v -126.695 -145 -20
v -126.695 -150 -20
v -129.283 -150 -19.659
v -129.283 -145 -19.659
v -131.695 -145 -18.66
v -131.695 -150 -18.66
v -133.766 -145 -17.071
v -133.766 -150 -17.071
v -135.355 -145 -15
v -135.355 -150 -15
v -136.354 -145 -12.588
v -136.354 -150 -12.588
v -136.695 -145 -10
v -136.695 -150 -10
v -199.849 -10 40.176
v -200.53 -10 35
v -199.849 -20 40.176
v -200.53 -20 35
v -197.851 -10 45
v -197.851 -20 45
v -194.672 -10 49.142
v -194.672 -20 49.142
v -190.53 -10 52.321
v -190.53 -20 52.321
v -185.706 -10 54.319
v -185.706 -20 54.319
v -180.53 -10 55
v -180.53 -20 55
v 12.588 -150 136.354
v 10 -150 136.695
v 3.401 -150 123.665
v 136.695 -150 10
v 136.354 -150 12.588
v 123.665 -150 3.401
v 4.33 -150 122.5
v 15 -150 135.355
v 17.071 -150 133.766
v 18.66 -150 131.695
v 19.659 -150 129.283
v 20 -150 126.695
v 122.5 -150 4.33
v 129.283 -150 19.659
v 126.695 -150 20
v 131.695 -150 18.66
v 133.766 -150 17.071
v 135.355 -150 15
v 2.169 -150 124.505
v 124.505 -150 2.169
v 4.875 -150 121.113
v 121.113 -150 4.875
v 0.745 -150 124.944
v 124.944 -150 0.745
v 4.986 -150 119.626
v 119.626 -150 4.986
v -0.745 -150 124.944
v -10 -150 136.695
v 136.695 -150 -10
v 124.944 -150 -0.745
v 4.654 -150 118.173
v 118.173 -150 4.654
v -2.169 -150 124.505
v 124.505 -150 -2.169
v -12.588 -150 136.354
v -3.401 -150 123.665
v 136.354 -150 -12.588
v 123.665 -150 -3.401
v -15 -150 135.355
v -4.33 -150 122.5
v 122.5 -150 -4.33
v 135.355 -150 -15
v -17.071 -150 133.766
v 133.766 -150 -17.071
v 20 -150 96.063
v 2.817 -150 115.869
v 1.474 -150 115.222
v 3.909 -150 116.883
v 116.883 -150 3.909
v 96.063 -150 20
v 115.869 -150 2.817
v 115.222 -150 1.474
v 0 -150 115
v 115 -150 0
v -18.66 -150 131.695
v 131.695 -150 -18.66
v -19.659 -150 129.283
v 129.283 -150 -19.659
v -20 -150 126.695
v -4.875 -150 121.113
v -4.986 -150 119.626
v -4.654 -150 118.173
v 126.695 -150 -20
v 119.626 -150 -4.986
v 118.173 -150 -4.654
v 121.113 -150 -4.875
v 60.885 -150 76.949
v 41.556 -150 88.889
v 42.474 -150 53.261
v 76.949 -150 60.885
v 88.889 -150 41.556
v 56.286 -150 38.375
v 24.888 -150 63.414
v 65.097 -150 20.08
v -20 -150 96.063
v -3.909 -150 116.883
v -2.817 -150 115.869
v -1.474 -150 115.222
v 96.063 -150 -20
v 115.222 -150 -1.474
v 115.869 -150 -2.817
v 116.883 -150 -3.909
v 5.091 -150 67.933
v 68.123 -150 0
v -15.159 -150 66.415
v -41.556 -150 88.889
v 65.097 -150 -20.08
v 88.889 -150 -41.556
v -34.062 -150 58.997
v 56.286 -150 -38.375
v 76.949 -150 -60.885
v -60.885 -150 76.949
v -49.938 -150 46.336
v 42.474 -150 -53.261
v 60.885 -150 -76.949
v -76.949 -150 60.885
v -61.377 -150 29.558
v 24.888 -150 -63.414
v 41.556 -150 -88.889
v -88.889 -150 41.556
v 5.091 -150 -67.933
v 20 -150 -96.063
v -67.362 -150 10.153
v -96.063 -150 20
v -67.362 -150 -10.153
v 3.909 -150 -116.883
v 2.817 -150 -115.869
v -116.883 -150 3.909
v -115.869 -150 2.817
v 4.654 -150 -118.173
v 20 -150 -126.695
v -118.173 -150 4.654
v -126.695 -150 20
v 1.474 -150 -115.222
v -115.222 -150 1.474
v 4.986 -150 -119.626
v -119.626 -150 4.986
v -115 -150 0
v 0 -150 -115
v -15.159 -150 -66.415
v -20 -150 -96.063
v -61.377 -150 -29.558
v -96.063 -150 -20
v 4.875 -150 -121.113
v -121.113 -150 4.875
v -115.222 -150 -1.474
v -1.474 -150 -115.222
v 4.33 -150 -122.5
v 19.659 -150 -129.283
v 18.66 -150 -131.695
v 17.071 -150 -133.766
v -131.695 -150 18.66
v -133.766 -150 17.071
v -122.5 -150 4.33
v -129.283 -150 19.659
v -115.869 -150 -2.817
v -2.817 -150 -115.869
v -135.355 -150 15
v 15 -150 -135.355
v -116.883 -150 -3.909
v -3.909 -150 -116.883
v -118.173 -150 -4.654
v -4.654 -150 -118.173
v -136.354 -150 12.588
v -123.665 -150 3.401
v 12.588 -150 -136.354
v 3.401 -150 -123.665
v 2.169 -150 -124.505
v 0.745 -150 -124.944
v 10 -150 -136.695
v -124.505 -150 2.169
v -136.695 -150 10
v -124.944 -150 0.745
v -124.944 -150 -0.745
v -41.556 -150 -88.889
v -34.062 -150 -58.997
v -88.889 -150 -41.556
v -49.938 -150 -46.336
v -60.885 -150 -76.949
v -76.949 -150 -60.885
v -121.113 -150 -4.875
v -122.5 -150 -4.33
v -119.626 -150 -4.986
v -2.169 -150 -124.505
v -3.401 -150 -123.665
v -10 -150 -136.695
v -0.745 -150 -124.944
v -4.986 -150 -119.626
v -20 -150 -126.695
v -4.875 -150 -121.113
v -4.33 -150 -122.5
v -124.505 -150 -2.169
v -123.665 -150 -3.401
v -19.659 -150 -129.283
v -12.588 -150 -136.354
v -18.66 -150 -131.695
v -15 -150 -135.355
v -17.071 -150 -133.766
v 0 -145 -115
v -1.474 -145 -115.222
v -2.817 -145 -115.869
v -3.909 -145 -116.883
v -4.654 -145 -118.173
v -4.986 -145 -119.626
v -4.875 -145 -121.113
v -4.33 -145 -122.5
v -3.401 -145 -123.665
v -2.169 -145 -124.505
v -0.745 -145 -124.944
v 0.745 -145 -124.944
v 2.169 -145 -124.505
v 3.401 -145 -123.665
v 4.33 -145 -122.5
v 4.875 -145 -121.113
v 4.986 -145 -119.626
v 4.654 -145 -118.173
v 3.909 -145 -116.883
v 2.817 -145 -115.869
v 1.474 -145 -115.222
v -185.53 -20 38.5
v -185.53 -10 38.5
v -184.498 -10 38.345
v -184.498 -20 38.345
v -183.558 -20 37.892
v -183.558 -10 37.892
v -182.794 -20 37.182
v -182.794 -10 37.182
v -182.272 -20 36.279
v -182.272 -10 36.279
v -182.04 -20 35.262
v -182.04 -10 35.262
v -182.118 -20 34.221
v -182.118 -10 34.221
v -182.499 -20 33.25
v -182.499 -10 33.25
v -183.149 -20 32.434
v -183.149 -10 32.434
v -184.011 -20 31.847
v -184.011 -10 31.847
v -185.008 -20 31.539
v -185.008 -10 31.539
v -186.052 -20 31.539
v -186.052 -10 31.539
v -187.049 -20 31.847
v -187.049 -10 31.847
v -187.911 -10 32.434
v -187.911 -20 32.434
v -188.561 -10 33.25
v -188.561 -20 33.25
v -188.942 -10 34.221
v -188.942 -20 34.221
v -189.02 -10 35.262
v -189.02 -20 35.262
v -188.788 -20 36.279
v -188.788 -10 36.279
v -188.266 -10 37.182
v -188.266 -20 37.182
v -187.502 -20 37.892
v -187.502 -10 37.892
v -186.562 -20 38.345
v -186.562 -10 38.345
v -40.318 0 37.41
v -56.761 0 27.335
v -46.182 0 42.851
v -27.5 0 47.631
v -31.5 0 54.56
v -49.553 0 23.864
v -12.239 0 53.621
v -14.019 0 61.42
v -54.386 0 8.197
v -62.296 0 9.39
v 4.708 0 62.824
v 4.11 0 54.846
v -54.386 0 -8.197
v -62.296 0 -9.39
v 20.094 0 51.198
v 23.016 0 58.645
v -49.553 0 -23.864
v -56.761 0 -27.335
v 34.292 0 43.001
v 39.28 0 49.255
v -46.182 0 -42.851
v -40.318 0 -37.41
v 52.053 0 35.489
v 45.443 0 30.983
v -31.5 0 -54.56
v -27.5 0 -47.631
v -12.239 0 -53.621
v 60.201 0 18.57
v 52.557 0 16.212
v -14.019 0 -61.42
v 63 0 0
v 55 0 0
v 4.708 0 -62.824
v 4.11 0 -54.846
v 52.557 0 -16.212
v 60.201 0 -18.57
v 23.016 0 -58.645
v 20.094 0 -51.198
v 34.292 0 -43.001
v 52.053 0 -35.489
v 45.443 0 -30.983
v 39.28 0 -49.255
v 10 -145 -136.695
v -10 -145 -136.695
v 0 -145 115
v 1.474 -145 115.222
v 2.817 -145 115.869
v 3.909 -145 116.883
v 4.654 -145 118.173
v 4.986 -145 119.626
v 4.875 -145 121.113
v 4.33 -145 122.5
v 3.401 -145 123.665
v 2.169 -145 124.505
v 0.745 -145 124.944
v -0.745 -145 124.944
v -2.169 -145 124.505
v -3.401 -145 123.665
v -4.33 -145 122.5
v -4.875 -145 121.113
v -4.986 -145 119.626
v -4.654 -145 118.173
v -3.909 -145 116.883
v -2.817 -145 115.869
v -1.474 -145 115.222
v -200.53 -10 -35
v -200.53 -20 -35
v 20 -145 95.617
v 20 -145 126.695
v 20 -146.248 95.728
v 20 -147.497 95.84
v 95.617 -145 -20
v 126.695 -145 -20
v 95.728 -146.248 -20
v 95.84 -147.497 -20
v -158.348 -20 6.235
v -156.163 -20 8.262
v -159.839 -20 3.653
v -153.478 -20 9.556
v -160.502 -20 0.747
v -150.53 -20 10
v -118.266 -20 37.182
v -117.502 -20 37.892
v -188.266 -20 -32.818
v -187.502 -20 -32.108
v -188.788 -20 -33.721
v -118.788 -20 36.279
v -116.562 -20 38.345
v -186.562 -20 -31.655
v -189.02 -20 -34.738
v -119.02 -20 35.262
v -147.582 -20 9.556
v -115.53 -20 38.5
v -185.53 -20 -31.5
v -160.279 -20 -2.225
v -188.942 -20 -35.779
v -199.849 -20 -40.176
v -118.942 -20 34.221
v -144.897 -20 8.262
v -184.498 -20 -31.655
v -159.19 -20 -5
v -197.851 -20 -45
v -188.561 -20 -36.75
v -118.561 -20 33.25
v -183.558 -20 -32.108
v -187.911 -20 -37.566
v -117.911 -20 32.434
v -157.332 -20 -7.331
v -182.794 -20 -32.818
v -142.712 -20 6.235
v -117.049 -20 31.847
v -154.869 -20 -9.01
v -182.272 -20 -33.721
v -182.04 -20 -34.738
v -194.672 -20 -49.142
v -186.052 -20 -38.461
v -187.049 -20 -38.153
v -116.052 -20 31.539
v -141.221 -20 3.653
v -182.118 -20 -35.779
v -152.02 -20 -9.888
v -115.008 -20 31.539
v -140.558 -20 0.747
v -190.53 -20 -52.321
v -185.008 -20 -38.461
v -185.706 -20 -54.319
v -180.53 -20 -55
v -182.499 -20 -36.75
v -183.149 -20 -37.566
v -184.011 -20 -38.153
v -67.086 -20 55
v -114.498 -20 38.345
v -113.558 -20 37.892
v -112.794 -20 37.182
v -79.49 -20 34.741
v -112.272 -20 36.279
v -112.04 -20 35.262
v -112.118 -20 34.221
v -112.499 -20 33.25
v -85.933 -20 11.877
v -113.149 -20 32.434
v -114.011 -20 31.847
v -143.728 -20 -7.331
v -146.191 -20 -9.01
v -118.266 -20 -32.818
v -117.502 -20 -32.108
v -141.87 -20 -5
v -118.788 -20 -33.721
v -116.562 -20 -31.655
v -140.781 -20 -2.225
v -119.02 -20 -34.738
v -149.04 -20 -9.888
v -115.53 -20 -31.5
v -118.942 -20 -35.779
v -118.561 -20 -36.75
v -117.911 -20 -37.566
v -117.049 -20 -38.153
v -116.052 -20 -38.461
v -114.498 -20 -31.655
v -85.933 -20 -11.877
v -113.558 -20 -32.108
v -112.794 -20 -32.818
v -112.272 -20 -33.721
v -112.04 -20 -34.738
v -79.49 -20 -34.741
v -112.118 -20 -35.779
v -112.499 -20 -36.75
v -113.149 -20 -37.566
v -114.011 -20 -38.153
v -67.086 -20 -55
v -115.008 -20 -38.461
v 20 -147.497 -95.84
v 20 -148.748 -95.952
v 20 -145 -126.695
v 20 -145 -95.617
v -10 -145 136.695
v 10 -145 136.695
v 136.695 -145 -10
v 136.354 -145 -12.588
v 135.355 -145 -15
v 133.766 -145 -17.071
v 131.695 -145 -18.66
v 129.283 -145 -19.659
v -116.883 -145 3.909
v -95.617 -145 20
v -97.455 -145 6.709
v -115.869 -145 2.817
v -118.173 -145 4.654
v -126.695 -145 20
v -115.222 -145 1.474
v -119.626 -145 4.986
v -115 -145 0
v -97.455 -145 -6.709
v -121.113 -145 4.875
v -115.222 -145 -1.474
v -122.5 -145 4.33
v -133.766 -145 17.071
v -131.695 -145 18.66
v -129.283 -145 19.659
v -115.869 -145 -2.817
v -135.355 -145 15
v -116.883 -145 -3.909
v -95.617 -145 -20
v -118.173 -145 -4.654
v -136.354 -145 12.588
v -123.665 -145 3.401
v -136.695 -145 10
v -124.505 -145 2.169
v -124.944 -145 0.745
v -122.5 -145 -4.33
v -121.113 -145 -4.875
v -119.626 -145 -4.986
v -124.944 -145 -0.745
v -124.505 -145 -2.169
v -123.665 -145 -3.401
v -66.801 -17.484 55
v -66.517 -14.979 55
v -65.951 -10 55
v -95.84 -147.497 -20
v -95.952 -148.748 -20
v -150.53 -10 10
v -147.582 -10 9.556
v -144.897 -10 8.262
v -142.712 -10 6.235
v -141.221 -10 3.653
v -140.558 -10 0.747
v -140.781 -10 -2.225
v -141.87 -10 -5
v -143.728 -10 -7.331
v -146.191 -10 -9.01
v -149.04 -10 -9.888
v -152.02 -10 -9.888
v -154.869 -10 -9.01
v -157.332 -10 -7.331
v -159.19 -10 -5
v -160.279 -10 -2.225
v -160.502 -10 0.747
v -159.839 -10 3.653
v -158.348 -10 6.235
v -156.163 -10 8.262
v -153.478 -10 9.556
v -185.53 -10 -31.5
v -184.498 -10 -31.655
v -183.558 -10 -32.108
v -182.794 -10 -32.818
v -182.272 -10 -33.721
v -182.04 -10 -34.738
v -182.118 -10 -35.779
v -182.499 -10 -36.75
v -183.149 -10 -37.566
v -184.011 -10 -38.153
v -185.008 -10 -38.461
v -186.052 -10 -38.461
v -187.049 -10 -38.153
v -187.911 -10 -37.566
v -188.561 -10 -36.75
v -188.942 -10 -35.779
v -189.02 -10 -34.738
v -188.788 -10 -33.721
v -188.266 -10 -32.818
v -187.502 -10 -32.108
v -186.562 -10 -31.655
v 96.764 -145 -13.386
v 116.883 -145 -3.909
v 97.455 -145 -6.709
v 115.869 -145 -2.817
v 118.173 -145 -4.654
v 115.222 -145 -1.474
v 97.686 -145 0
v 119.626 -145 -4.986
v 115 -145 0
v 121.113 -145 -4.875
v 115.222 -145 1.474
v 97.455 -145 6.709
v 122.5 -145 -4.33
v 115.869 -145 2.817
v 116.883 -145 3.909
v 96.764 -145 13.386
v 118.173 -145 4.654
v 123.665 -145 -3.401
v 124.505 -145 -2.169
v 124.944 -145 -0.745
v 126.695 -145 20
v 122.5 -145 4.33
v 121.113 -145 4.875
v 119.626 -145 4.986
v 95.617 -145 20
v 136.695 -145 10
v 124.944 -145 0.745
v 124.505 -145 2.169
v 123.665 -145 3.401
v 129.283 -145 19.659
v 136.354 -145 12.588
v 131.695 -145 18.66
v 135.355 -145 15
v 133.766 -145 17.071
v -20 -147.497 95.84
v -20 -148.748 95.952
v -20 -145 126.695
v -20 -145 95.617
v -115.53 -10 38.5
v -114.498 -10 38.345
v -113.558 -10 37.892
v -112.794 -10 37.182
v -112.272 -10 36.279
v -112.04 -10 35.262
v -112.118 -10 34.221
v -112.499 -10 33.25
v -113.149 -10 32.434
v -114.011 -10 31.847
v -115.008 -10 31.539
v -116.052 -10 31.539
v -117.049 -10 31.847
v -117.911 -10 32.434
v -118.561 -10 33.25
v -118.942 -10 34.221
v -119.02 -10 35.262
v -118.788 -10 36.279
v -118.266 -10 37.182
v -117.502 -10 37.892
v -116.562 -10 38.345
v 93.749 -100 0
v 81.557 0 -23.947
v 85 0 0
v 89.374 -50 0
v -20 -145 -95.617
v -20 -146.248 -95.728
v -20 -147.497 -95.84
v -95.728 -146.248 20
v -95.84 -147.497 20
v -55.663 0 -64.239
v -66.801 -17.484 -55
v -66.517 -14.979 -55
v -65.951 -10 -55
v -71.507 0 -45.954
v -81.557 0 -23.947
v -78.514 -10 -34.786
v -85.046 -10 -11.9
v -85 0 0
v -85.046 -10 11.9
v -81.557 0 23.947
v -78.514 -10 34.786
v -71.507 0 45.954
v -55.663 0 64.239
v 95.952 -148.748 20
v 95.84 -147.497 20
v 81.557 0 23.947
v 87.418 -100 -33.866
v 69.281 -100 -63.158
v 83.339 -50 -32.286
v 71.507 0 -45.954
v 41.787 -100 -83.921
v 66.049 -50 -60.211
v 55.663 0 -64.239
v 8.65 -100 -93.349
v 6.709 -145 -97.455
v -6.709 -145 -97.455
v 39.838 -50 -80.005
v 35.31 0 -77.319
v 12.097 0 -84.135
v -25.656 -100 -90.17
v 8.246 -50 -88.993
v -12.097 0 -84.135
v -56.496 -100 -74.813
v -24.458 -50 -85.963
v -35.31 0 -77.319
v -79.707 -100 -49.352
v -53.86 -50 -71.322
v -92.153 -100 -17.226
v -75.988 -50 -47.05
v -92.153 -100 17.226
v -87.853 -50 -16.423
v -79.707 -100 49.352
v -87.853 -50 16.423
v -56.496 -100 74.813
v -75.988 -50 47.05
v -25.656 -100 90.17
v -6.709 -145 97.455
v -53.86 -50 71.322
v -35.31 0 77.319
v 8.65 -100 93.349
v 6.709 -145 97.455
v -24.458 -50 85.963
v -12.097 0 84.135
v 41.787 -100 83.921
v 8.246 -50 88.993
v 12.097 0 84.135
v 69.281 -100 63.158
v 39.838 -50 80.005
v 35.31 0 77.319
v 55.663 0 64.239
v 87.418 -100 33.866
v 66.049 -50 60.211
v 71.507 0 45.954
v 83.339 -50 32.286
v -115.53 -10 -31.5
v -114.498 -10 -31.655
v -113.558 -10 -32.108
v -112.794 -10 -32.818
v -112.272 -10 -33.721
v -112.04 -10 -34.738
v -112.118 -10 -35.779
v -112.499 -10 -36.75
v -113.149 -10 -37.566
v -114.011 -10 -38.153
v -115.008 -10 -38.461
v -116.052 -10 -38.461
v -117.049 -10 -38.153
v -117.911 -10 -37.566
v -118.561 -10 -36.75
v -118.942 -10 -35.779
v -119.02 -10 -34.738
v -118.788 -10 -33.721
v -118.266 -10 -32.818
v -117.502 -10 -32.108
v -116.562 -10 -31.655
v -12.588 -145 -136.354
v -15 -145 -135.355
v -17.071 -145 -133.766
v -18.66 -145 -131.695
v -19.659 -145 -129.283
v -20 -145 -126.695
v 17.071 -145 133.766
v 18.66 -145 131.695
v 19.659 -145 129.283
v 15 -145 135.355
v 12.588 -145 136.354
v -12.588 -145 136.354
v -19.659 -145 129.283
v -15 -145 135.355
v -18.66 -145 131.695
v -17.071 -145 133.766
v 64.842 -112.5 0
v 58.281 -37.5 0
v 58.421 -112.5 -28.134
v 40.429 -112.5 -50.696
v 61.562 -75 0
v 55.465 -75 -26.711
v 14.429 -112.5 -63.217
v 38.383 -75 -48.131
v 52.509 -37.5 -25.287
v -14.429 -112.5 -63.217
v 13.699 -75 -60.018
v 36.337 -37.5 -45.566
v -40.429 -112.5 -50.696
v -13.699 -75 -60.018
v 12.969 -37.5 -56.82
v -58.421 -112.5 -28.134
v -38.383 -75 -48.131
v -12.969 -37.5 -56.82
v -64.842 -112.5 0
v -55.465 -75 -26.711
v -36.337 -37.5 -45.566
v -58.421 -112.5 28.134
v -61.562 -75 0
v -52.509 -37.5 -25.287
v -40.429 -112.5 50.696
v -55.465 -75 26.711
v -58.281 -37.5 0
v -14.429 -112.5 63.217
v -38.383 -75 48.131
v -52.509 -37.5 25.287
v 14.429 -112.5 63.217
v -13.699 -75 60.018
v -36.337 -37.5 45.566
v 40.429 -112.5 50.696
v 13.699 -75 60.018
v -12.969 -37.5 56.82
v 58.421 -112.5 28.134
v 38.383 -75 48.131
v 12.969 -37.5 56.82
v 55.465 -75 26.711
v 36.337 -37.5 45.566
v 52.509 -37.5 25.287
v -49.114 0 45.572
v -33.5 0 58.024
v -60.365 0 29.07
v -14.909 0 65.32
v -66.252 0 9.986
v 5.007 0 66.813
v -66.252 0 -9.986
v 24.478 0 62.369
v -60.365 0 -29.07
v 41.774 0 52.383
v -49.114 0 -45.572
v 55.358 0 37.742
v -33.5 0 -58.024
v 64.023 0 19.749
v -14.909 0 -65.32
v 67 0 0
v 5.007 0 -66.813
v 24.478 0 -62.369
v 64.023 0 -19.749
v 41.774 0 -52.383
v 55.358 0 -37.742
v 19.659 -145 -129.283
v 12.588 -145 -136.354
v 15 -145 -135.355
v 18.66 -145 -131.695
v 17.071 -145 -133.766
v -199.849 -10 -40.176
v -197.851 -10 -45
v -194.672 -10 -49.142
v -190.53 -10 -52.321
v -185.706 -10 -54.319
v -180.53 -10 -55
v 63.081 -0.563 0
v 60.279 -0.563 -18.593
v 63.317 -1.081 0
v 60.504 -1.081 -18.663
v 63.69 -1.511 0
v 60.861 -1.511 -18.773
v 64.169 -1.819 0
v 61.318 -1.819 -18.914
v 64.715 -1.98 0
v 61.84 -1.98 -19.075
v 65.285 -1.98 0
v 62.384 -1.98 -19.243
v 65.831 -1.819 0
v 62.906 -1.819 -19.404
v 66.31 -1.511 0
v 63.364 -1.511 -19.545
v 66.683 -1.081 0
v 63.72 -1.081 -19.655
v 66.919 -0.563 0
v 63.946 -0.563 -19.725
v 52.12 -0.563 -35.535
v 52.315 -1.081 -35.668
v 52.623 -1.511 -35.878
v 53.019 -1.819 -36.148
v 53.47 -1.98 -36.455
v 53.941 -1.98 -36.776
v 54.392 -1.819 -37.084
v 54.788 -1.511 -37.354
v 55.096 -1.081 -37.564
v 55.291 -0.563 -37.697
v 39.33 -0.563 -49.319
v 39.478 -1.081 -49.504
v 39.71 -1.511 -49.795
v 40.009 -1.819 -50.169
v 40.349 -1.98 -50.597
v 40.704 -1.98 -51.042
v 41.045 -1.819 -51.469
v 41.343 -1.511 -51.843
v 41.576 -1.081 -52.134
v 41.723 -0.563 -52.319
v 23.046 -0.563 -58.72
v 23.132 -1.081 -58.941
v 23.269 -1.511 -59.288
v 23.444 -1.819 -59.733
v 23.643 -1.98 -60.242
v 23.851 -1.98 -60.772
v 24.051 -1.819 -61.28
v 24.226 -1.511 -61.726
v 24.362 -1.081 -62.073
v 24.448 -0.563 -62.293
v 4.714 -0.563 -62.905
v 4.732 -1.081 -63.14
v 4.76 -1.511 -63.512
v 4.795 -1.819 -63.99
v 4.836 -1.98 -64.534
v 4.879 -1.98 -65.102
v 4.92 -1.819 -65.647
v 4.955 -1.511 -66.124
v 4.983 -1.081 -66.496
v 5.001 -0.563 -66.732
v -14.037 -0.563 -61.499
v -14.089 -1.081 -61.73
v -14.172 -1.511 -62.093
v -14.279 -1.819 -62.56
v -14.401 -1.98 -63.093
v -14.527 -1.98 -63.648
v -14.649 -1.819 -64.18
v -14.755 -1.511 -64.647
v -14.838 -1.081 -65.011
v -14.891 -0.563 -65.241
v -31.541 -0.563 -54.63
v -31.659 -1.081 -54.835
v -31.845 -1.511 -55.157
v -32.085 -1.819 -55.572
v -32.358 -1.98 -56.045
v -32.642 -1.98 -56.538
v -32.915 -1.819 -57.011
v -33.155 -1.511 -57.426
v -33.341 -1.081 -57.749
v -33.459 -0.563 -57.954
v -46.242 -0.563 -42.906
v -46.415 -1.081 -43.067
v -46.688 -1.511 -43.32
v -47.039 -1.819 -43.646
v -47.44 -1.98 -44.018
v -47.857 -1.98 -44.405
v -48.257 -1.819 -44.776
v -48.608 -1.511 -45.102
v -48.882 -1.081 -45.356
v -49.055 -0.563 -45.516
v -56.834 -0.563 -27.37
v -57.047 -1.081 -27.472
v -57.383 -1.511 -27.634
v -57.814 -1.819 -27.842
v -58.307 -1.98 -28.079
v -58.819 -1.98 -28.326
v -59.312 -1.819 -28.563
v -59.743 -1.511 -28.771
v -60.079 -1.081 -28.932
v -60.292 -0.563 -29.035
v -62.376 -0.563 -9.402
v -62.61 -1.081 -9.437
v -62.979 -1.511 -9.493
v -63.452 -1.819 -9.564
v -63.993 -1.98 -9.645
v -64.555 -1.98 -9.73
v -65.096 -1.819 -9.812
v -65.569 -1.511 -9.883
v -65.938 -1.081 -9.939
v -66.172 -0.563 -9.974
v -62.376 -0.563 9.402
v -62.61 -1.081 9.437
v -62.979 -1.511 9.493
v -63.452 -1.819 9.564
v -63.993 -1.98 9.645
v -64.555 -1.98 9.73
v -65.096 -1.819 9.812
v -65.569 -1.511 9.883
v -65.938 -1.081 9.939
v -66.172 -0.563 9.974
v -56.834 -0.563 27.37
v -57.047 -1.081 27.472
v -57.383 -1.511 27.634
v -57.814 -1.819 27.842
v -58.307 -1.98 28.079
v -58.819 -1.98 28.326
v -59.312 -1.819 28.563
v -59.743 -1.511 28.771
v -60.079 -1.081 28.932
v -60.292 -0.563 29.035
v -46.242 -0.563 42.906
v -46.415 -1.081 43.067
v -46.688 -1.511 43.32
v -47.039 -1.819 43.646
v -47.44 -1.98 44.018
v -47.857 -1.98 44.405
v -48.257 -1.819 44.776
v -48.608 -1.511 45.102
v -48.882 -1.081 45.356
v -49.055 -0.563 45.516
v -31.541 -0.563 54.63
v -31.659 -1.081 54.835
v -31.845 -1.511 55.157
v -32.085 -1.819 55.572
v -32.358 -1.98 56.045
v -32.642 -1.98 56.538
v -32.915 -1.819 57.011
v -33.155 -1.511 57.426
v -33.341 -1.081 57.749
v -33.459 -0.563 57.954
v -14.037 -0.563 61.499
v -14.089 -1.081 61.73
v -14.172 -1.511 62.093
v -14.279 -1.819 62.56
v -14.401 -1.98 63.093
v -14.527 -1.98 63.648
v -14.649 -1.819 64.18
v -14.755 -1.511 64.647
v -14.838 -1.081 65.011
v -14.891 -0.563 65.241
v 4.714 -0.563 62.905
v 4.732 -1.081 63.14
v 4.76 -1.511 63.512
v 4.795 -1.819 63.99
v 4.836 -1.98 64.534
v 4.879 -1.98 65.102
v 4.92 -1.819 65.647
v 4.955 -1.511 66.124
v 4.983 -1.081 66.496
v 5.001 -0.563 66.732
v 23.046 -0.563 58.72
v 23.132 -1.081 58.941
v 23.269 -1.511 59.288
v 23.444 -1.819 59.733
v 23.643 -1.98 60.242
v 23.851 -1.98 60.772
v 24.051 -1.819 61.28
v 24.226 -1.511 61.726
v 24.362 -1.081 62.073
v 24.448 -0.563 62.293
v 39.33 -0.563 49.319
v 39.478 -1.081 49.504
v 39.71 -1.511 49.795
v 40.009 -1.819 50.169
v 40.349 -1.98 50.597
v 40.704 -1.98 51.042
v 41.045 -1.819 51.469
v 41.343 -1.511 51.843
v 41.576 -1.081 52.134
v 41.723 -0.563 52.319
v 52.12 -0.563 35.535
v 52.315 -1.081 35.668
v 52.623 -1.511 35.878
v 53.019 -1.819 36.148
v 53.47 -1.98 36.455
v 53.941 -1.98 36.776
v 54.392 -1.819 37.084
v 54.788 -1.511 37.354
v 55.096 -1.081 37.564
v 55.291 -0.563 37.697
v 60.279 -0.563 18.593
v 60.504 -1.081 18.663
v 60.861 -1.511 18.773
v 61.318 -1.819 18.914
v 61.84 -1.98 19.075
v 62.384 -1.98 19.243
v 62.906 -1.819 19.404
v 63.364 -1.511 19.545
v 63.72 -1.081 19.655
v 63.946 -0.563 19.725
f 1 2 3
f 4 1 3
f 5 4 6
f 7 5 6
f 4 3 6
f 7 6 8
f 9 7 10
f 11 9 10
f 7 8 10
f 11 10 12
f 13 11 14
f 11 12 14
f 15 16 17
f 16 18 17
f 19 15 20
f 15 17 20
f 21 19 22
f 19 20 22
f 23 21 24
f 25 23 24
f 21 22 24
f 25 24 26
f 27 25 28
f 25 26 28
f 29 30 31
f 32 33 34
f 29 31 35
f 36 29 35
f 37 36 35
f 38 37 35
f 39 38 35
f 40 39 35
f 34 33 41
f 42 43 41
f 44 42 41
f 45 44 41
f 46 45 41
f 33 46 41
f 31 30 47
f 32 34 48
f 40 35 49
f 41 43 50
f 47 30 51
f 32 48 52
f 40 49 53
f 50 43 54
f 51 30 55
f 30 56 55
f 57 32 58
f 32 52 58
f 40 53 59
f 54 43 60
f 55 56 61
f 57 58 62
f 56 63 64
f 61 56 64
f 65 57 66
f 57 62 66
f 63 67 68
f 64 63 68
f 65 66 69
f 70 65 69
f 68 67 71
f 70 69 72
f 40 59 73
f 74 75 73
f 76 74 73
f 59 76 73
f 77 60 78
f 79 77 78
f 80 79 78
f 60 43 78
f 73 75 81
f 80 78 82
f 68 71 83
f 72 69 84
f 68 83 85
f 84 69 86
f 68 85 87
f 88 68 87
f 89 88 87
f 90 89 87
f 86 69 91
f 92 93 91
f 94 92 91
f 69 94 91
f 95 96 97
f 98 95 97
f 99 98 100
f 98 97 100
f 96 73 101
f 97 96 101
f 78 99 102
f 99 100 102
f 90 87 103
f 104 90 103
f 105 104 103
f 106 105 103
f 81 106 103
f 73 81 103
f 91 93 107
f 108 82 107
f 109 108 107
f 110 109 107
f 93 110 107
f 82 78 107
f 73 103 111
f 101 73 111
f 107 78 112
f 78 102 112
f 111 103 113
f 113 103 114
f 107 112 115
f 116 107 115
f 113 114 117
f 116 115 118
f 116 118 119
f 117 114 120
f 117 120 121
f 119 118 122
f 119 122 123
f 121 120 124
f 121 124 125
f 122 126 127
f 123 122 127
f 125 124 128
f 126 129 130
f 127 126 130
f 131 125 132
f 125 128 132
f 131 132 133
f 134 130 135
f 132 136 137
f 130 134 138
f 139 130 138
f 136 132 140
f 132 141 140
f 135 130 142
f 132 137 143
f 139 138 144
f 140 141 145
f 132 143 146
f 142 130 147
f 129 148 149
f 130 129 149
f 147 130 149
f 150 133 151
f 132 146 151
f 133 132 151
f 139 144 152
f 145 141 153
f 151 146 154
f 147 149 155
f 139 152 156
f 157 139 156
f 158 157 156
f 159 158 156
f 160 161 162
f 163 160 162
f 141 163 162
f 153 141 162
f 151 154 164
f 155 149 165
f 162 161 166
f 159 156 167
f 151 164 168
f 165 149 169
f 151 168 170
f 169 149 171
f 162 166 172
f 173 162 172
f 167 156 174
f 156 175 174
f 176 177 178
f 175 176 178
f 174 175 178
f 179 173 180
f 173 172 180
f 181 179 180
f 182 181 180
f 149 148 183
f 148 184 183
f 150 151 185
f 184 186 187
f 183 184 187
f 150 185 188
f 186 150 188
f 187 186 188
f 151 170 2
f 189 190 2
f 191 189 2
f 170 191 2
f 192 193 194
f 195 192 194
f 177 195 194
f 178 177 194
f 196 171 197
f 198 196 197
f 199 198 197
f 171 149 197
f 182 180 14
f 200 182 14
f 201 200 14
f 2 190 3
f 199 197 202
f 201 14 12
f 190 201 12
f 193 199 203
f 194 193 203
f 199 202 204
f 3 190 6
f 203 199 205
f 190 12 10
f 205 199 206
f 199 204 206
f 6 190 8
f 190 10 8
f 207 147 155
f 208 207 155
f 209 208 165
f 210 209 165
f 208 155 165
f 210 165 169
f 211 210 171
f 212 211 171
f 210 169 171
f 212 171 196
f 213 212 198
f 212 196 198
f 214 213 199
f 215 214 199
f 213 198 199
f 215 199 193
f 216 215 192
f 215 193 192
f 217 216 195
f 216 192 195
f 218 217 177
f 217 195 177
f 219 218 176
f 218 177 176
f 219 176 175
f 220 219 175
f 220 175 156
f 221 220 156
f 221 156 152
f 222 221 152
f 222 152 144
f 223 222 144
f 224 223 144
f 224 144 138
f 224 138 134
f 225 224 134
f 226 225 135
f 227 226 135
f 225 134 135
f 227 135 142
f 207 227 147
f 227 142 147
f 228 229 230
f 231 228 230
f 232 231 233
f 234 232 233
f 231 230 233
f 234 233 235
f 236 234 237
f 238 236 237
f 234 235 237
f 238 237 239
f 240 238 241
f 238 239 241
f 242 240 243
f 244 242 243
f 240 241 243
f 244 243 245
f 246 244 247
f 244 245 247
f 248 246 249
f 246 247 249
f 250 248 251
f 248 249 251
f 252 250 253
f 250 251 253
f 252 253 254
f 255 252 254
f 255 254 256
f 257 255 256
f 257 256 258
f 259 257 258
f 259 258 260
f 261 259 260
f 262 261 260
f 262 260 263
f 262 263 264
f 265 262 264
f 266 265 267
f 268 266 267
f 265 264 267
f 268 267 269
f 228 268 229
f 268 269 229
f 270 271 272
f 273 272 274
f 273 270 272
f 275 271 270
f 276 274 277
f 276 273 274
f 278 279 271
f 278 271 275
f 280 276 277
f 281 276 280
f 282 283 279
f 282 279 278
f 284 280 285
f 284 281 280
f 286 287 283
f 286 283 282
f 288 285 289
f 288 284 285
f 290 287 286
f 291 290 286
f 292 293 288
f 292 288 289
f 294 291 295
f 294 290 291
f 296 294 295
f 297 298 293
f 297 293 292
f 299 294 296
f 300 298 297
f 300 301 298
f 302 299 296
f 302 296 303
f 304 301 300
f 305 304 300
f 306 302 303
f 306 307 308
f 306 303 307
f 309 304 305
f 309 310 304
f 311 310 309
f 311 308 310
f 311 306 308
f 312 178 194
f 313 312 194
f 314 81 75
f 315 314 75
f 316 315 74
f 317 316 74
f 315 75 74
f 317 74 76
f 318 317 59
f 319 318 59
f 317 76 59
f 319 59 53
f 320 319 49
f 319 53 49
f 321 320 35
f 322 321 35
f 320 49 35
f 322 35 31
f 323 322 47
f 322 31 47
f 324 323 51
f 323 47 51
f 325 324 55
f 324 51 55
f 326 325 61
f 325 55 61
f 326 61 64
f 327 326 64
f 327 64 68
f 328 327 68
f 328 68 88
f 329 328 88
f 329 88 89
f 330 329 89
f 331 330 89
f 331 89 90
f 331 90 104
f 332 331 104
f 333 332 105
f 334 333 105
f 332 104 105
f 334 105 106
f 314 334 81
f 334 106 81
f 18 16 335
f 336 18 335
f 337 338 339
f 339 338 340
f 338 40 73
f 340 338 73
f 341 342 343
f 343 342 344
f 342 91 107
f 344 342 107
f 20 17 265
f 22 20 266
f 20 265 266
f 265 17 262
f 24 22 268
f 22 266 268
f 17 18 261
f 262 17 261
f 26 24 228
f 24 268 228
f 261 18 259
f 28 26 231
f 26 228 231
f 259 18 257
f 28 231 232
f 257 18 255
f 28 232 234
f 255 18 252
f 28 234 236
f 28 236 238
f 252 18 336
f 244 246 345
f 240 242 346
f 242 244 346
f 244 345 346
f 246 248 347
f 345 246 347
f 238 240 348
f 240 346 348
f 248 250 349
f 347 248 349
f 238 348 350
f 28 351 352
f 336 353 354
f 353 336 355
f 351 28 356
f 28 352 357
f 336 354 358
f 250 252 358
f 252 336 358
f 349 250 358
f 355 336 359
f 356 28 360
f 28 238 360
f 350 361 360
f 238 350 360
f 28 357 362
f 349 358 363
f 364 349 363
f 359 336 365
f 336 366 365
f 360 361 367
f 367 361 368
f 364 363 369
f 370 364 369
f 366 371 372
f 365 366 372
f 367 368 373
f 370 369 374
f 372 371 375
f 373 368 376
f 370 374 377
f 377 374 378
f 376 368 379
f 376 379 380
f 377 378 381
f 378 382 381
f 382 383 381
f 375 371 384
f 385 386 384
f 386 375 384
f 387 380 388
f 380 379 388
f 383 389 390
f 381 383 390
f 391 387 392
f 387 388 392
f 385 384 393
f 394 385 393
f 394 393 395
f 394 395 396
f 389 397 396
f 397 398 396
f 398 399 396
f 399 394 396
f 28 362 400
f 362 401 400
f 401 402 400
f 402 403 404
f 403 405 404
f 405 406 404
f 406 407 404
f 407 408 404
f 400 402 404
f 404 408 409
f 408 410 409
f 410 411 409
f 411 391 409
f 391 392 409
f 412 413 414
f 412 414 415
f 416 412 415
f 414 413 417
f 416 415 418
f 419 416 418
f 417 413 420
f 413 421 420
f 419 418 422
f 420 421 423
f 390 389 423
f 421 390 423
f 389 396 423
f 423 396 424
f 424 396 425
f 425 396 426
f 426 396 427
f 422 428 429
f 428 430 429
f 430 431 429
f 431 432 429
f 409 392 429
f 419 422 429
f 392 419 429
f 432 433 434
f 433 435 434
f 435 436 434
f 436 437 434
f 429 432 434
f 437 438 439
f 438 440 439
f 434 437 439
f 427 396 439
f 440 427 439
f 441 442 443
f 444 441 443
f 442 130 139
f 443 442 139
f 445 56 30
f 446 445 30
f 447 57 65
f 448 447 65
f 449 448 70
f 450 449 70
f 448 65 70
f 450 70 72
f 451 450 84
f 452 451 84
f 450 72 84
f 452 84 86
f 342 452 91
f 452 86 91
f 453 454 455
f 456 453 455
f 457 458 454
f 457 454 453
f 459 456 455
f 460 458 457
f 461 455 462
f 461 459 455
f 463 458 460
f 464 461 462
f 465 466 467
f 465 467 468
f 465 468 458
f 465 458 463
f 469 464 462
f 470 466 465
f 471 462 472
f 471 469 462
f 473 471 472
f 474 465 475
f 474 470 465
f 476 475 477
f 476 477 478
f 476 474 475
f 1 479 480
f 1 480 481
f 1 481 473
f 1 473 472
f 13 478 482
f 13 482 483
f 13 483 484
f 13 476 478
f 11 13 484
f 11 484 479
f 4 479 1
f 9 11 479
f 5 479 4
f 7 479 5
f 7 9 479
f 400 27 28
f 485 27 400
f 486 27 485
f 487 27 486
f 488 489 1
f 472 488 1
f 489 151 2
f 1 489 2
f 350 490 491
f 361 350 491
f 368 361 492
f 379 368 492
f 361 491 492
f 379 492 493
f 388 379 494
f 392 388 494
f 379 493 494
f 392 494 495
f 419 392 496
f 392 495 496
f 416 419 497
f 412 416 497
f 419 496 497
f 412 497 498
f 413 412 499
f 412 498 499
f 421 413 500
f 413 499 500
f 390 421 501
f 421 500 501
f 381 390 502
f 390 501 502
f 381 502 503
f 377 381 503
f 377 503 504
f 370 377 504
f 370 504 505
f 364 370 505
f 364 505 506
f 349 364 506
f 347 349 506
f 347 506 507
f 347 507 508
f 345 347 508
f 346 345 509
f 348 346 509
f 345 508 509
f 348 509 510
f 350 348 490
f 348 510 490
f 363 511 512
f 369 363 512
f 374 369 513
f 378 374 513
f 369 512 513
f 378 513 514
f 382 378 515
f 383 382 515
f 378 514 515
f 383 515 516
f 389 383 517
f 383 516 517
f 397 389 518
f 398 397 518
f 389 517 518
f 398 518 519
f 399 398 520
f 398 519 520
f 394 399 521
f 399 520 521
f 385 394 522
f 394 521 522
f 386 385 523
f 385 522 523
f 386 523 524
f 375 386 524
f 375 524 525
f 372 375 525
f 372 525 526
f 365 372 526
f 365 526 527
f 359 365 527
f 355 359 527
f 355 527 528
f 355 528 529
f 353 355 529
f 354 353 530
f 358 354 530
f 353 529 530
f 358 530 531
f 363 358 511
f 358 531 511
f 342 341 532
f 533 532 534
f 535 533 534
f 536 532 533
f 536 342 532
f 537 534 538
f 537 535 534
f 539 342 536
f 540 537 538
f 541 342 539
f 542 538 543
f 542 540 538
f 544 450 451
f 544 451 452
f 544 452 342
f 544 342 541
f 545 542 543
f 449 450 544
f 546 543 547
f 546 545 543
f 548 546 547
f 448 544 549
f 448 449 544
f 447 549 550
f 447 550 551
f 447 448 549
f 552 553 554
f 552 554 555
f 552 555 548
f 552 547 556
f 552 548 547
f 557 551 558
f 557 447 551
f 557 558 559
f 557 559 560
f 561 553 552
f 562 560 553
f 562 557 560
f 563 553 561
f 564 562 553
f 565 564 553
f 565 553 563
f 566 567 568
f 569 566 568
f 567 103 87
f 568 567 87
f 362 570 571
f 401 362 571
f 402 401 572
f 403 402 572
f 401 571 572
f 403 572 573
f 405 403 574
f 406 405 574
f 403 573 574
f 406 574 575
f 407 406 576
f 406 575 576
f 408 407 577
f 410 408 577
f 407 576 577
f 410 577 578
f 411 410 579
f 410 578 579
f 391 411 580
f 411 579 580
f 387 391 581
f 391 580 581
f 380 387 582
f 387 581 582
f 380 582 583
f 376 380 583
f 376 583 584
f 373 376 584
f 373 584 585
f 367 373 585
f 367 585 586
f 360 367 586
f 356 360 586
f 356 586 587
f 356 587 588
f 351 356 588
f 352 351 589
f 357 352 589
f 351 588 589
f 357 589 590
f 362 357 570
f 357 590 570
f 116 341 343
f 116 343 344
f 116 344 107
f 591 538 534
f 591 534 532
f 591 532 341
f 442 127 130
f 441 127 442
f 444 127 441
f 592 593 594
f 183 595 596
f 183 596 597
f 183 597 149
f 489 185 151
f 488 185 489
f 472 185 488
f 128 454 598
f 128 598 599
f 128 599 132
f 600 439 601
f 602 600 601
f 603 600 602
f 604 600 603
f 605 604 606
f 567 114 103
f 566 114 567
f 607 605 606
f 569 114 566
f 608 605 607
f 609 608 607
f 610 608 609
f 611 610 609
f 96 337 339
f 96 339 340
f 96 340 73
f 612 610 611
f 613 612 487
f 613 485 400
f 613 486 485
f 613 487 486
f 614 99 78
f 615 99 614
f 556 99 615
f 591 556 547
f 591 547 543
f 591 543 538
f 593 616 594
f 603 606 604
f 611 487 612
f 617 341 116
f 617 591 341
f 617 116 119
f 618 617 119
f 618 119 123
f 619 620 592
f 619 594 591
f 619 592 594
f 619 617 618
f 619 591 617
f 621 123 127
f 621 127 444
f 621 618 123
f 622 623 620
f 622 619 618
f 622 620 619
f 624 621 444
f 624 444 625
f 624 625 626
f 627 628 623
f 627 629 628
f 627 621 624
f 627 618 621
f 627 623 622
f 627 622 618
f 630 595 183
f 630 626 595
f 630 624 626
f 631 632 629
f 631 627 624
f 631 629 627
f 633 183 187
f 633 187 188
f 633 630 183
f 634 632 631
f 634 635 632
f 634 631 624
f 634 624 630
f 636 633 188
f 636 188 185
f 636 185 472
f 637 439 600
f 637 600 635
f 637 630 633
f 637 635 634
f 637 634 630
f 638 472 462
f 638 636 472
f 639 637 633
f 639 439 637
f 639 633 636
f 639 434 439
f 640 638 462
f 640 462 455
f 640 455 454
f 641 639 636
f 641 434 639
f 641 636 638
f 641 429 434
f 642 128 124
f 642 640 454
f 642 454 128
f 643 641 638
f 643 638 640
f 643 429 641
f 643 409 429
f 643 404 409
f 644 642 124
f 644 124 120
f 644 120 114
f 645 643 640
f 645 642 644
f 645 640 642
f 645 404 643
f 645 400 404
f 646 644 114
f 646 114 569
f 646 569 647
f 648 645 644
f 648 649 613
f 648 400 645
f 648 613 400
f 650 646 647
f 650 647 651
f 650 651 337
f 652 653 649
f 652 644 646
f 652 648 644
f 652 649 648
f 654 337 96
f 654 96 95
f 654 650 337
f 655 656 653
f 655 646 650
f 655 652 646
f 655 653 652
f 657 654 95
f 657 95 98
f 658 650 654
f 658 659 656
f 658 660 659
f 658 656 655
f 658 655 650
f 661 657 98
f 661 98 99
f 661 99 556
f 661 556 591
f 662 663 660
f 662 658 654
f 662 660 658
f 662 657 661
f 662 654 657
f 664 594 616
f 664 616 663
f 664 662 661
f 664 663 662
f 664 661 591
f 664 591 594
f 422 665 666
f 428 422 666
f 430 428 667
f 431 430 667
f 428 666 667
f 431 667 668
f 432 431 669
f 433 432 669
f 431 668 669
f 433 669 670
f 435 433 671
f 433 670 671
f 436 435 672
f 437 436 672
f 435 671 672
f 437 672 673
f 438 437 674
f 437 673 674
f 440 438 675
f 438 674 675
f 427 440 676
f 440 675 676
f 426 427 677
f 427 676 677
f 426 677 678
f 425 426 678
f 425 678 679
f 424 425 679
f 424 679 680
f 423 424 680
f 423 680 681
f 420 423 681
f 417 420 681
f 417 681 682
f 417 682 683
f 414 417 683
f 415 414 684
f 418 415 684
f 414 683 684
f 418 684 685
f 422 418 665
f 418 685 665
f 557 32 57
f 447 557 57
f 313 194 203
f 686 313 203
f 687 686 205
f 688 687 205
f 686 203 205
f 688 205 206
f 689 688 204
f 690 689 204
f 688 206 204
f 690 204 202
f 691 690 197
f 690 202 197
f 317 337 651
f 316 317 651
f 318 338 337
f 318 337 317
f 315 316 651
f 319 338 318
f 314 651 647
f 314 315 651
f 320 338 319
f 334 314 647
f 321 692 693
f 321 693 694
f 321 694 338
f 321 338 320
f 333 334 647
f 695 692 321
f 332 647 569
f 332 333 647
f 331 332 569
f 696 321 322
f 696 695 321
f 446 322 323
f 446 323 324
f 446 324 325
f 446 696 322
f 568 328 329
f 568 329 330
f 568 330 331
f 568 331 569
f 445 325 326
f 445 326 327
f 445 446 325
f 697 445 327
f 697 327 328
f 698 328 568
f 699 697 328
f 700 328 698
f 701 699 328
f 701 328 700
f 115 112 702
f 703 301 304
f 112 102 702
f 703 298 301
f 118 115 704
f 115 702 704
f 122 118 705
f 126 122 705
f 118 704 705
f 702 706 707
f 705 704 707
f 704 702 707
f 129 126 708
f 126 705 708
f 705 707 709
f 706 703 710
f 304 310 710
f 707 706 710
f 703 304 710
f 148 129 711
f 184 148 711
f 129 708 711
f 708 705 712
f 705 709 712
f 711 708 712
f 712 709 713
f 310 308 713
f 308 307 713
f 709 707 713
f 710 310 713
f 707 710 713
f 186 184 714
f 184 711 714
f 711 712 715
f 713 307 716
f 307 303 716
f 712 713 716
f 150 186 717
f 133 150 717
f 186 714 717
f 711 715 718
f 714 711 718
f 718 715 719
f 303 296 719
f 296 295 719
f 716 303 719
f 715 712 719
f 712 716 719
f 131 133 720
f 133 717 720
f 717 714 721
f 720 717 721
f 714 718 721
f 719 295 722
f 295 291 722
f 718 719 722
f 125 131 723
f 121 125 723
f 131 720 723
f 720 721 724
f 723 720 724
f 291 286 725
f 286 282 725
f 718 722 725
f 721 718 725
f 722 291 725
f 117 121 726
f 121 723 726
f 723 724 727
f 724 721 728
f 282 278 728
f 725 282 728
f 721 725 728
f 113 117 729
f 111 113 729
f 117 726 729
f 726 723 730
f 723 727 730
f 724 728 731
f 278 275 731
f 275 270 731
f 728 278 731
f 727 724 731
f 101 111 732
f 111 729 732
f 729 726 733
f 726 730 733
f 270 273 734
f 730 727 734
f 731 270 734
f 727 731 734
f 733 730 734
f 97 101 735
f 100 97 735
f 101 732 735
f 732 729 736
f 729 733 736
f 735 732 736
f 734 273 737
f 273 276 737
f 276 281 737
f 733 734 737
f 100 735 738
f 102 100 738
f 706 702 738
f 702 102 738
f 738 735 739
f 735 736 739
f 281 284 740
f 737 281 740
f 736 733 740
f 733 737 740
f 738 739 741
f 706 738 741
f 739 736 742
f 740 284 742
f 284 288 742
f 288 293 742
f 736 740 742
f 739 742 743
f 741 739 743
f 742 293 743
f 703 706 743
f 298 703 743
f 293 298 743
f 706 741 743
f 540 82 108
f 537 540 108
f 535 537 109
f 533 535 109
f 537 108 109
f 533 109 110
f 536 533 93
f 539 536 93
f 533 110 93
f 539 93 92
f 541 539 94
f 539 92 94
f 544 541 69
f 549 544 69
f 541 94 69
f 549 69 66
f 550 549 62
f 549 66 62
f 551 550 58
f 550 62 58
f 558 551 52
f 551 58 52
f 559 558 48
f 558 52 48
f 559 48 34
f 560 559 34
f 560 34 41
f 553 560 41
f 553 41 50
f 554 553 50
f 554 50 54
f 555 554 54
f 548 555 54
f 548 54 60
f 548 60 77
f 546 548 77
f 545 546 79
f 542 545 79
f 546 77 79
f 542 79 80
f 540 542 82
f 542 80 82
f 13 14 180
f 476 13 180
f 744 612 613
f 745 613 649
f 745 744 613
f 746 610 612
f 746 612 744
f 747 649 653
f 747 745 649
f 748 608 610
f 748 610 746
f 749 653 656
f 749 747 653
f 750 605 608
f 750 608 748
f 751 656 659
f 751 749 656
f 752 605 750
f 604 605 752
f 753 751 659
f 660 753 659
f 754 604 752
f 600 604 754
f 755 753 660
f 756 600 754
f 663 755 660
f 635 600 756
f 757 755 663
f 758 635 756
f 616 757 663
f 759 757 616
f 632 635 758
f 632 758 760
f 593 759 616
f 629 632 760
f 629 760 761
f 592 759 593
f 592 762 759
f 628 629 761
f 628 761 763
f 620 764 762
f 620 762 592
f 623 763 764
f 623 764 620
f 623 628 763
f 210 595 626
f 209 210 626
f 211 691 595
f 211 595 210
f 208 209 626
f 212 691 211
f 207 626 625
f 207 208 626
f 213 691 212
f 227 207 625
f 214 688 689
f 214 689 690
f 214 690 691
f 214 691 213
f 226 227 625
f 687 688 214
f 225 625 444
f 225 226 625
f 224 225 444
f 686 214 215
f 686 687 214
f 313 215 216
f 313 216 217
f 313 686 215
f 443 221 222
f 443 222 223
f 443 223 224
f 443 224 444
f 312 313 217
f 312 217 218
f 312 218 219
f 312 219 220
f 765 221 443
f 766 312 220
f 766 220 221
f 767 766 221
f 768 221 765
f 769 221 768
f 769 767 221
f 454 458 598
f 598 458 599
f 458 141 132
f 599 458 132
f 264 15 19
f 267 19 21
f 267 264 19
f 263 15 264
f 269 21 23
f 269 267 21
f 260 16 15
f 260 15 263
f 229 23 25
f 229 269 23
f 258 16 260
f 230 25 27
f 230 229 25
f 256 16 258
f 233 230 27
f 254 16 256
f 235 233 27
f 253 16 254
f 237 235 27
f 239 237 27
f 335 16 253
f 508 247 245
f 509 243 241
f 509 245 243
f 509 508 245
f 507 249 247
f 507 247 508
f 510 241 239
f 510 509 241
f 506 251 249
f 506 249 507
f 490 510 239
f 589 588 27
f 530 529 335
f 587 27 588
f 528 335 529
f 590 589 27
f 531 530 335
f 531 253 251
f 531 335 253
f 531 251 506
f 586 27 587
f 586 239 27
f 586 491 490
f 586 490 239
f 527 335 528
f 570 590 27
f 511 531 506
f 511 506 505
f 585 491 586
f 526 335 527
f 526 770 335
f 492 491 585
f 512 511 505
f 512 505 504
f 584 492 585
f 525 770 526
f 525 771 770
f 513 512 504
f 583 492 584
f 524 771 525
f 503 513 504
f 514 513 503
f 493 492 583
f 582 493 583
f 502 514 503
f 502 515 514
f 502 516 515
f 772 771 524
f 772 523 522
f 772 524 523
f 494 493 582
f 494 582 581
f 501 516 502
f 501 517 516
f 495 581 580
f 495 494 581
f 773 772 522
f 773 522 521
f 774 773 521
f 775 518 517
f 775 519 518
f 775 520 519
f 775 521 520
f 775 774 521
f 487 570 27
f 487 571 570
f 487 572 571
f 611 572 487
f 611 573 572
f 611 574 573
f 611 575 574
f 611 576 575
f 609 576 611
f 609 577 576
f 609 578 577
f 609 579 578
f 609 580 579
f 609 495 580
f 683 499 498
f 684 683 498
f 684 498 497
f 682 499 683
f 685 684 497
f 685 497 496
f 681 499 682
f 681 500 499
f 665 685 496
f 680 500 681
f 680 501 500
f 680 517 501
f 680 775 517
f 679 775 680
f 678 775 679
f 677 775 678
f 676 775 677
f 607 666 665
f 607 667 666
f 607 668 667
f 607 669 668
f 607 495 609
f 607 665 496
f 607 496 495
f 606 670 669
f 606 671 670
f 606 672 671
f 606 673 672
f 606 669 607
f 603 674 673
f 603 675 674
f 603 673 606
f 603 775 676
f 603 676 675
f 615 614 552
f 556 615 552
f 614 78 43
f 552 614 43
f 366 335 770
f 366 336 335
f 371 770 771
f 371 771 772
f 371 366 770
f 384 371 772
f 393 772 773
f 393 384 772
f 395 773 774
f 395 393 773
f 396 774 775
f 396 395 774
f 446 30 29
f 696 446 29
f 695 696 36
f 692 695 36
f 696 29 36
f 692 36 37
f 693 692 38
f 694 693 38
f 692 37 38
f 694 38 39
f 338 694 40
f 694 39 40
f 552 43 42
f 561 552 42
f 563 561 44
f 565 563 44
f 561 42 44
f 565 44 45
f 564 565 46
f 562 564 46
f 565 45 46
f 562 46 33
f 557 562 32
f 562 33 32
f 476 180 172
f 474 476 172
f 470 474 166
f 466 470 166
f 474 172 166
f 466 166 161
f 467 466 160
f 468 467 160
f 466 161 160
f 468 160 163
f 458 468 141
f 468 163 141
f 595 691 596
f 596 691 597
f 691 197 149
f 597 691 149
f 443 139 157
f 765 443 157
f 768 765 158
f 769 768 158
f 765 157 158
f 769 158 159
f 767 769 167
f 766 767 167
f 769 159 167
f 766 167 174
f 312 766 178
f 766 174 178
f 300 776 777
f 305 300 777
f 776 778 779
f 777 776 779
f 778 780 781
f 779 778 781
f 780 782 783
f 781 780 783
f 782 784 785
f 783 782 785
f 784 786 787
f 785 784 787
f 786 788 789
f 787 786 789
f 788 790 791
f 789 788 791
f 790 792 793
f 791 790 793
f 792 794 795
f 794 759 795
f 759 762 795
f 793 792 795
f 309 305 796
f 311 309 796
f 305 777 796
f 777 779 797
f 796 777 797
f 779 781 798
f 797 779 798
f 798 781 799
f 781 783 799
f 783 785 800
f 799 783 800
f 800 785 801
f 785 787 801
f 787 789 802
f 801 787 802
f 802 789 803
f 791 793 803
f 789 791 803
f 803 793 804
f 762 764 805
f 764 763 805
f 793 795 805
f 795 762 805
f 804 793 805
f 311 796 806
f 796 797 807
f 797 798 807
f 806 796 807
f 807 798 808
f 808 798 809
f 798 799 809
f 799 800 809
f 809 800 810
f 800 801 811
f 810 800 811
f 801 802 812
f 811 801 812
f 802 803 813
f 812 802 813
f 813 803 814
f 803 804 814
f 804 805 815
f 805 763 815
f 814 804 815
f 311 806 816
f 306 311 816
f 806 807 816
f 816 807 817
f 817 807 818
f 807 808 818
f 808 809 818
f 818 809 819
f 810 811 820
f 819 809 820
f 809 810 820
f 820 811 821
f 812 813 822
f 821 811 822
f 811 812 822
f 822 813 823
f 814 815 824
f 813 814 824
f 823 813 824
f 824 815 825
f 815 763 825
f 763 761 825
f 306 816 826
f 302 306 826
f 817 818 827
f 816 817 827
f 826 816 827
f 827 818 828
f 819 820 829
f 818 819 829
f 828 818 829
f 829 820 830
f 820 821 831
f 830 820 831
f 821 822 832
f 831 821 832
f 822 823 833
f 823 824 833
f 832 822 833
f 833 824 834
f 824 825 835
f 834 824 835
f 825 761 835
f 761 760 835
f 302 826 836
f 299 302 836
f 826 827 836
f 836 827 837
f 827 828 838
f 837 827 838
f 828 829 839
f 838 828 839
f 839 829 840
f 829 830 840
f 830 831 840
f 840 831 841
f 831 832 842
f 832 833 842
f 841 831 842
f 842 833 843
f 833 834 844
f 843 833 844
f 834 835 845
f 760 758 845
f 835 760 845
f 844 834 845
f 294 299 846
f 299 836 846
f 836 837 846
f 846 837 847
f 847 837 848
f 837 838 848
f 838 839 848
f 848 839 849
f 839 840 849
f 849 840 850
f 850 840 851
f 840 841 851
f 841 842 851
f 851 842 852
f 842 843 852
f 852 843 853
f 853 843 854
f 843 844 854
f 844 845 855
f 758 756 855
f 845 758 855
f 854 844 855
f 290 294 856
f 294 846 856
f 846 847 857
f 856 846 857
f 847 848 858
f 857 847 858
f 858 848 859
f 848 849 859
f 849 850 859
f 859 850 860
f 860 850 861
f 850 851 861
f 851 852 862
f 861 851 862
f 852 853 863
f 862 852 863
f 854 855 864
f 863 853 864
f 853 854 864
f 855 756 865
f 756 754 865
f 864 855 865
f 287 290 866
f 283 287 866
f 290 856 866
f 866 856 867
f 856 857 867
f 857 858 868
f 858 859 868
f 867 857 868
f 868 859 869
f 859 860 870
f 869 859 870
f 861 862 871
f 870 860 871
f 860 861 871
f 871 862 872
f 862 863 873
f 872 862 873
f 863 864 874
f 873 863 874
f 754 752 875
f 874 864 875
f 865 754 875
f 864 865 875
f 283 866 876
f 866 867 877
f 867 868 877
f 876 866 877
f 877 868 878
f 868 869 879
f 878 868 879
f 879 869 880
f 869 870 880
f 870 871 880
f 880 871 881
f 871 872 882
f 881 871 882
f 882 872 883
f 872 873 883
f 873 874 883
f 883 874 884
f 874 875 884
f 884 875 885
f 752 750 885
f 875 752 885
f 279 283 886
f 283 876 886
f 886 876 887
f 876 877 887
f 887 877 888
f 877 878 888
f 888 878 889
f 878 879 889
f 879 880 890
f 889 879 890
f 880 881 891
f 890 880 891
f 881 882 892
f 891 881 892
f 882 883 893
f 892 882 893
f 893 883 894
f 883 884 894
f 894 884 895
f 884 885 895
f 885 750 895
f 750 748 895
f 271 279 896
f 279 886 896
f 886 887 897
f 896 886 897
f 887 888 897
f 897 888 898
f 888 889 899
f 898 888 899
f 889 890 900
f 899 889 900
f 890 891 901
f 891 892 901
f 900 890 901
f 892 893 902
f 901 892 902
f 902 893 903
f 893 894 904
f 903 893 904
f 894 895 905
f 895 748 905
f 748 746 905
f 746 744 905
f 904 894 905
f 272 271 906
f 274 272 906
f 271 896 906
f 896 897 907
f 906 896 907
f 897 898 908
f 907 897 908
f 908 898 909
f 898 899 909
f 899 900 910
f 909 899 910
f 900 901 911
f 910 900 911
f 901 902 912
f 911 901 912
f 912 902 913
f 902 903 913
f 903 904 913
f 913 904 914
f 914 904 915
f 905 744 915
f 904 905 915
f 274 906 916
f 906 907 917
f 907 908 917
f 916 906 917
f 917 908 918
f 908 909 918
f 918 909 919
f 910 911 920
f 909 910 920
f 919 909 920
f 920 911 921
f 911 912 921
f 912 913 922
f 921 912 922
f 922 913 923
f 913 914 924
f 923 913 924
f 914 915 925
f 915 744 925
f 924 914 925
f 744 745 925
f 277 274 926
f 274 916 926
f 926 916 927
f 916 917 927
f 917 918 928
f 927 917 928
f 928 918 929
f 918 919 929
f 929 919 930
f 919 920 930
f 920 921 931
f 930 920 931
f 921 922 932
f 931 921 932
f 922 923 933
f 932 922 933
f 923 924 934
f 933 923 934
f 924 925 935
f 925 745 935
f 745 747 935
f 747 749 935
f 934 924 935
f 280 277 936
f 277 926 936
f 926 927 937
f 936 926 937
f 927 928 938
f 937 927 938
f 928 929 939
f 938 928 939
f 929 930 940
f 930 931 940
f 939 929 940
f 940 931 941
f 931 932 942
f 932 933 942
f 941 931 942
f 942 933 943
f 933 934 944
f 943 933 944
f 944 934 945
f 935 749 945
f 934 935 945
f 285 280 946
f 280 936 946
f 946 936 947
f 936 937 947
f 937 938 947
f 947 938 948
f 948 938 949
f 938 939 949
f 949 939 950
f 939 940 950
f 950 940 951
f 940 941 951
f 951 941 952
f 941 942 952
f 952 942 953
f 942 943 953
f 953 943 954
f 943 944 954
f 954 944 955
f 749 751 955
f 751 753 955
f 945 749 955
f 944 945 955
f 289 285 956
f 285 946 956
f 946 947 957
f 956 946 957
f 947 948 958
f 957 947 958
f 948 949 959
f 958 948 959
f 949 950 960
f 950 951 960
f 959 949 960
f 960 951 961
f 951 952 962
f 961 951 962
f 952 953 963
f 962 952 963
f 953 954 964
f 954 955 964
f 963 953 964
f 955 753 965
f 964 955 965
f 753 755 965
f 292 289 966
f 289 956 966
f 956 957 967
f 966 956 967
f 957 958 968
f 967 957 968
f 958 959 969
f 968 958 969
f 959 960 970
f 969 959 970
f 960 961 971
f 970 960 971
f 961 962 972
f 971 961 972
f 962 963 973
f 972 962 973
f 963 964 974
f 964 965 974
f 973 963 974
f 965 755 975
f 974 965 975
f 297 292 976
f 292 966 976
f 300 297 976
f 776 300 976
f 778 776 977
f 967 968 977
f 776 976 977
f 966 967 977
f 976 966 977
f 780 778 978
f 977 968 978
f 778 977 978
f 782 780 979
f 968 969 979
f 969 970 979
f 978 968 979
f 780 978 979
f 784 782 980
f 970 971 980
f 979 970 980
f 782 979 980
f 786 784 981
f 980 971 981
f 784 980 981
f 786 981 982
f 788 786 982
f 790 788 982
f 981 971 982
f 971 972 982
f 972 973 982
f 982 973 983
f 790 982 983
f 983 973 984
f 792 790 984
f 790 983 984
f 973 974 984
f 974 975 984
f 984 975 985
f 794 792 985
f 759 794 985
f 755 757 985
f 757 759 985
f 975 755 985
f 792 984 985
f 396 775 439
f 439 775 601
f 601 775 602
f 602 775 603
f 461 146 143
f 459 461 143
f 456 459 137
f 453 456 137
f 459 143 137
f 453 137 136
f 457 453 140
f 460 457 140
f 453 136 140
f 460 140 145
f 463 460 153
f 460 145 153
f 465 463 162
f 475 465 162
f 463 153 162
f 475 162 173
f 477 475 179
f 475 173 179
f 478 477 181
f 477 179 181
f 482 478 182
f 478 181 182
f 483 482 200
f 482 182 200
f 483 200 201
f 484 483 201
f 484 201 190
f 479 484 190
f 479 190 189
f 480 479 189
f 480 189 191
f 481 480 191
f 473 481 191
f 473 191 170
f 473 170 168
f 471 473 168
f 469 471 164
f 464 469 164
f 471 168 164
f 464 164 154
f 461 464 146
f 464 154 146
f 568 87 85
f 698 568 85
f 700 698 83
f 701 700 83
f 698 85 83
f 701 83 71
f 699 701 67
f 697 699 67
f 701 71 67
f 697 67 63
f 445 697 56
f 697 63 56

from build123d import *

# Parameters (mm, degrees)
SKETCH1_R            = 85
BOSS_EXTRUDE1_DEPTH  = 150
BOSS_EXTRUDE1_DRAFT  = 5
CUT_SWEEP1_PROFILE_R = 2
SKETCH11_R           = 55
CUT_EXTRUDE1_DEPTH   = 150
CUT_EXTRUDE1_DRAFT   = 5
BOSS_EXTRUDE2_START  = -10
SKETCH13_W           = 140
SKETCH13_H           = 110
BOSS_EXTRUDE2_DEPTH  = 10
SKETCH14_R           = 10
CUT_EXTRUDE2_DEPTH   = 10
FILLET3_R            = 20
SKETCH15_R           = 3.5
CUT_EXTRUDE3_DEPTH   = 10
SKETCH17_R           = 5
BOSS_EXTRUDE3_DEPTH  = 5
CIRPATTERN1_COUNT    = 4


with BuildPart() as part:
    # Sketch1 → Boss-Extrude1 (with draft: the straight prism first)
    with BuildSketch(Plane(origin=(0, 0, 0), x_dir=(1, 0, 0), z_dir=(0, 1, 0))):
        Circle(SKETCH1_R)
    extrude(amount=-BOSS_EXTRUDE1_DEPTH)
    # Boss-Extrude1: the draft: its side faces are tilted about the plane it starts from
    boss_extrude1_sides = [part.faces().sort_by_distance(p)[0] for p in [
        (-85, -75, 0),
    ]]
    draft(boss_extrude1_sides, Plane(origin=(0, 0, 0), x_dir=(1, 0, 0), z_dir=(0, 1, 0)), BOSS_EXTRUDE1_DRAFT)

    # Cut-Sweep1: sweep along a path in Sketch2
    with BuildLine(Plane(origin=(0, 0, 0), x_dir=(1, 0, 0), z_dir=(0, 1, 0))) as cut_sweep1_path:
        CenterArc((0, 0), 65, 0, 360)
    # Cut-Sweep1 profile (on start of the path) → Cut-Sweep1 (sweep, cut)
    with BuildSketch(Plane(origin=(65, 0, 0), x_dir=(-1, 0, 0), z_dir=(0, 0, -1))):
        Circle(CUT_SWEEP1_PROFILE_R)
    sweep(path=cut_sweep1_path.line, mode=Mode.SUBTRACT)


with BuildPart() as cut_extrude1_tool:
    # Sketch11 → Cut-Extrude1 (with draft: the straight prism first)
    with BuildSketch(Plane(origin=(0, 0, 0), x_dir=(1, 0, 0), z_dir=(0, 1, 0))):
        Circle(SKETCH11_R)
    extrude(amount=-CUT_EXTRUDE1_DEPTH)
    # Cut-Extrude1: the draft: its side faces are tilted about the plane it starts from
    cut_extrude1_sides = [cut_extrude1_tool.faces().sort_by_distance(p)[0] for p in [
        (-55, -75, 0),
    ]]
    draft(cut_extrude1_sides, Plane(origin=(0, 0, 0), x_dir=(1, 0, 0), z_dir=(0, 1, 0)), CUT_EXTRUDE1_DRAFT)


with BuildPart() as part_1:
    add(part.part)

    # Cut-Extrude1: cut by cut_extrude1_tool
    add(cut_extrude1_tool.part, mode=Mode.SUBTRACT)

    # Sketch13 → Boss-Extrude2 (add)
    with BuildSketch(Plane(origin=(0, 0, 0), x_dir=(1, 0, 0), z_dir=(0, 1, 0)).offset(BOSS_EXTRUDE2_START)):
        with Locations((-130.53, 0)):
            Rectangle(SKETCH13_W, SKETCH13_H)
    extrude(amount=-BOSS_EXTRUDE2_DEPTH)

    # Sketch14 → Cut-Extrude2 (cut)
    with BuildSketch(Plane(origin=(0, -10, 0), x_dir=(1, 0, 0), z_dir=(0, 1, 0))):
        with Locations(Location((-150.53, 0, 0), (0, 0, 270))):
            Circle(SKETCH14_R)
    extrude(amount=-CUT_EXTRUDE2_DEPTH, mode=Mode.SUBTRACT)

    # Fillet3
    fillet3_edges = [part_1.edges().sort_by_distance(p)[0] for p in [
        (-200.53, -15, 55),
        (-200.53, -15, -55),
    ]]
    fillet(fillet3_edges, radius=FILLET3_R)

    # Sketch15 → Cut-Extrude3 (cut)
    with BuildSketch(Plane(origin=(0, -10, 0), x_dir=(1, 0, 0), z_dir=(0, 1, 0))):
        with Locations(Location((-185.53, 35, 0), (0, 0, 270))):
            Circle(SKETCH15_R)
        with Locations(Location((-115.53, 35, 0), (0, 0, 270))):
            Circle(SKETCH15_R)
        with Locations(Location((-115.53, -35, 0), (0, 0, 270))):
            Circle(SKETCH15_R)
        with Locations(Location((-185.53, -35, 0), (0, 0, 270))):
            Circle(SKETCH15_R)
    extrude(amount=-CUT_EXTRUDE3_DEPTH, mode=Mode.SUBTRACT)

    # Sketch17 → Boss-Extrude3 (add)
    with BuildSketch(Plane.XZ.offset(150)):
        with BuildLine():
            Line((-10, 136.694847673), (10, 136.694847673))
            ThreePointArc((10, 136.694847673), (17.071067812, 133.765915485), (20, 126.694847673))
            Line((20, 126.694847673), (20, 82.304982624))
            Line((20, 82.304982624), (-20, 82.304982624))
            Line((-20, 82.304982624), (-20, 126.694847673))
            ThreePointArc((-20, 126.694847673), (-17.071067812, 133.765915485), (-10, 136.694847673))
        make_face()
        with Locations(Location((0, 120, 0), (0, 0, 270))):
            Circle(SKETCH17_R, mode=Mode.SUBTRACT)
    boss_extrude3 = extrude(amount=-BOSS_EXTRUDE3_DEPTH)

    # CirPattern1: Boss-Extrude3 ×4 about axis
    cirpattern1_axis = Axis((0, 0, 0), (0, 1, 0))
    for i in range(1, CIRPATTERN1_COUNT):
        add(boss_extrude3.rotate(cirpattern1_axis, i * 360 / CIRPATTERN1_COUNT))


solid = part_1.part
